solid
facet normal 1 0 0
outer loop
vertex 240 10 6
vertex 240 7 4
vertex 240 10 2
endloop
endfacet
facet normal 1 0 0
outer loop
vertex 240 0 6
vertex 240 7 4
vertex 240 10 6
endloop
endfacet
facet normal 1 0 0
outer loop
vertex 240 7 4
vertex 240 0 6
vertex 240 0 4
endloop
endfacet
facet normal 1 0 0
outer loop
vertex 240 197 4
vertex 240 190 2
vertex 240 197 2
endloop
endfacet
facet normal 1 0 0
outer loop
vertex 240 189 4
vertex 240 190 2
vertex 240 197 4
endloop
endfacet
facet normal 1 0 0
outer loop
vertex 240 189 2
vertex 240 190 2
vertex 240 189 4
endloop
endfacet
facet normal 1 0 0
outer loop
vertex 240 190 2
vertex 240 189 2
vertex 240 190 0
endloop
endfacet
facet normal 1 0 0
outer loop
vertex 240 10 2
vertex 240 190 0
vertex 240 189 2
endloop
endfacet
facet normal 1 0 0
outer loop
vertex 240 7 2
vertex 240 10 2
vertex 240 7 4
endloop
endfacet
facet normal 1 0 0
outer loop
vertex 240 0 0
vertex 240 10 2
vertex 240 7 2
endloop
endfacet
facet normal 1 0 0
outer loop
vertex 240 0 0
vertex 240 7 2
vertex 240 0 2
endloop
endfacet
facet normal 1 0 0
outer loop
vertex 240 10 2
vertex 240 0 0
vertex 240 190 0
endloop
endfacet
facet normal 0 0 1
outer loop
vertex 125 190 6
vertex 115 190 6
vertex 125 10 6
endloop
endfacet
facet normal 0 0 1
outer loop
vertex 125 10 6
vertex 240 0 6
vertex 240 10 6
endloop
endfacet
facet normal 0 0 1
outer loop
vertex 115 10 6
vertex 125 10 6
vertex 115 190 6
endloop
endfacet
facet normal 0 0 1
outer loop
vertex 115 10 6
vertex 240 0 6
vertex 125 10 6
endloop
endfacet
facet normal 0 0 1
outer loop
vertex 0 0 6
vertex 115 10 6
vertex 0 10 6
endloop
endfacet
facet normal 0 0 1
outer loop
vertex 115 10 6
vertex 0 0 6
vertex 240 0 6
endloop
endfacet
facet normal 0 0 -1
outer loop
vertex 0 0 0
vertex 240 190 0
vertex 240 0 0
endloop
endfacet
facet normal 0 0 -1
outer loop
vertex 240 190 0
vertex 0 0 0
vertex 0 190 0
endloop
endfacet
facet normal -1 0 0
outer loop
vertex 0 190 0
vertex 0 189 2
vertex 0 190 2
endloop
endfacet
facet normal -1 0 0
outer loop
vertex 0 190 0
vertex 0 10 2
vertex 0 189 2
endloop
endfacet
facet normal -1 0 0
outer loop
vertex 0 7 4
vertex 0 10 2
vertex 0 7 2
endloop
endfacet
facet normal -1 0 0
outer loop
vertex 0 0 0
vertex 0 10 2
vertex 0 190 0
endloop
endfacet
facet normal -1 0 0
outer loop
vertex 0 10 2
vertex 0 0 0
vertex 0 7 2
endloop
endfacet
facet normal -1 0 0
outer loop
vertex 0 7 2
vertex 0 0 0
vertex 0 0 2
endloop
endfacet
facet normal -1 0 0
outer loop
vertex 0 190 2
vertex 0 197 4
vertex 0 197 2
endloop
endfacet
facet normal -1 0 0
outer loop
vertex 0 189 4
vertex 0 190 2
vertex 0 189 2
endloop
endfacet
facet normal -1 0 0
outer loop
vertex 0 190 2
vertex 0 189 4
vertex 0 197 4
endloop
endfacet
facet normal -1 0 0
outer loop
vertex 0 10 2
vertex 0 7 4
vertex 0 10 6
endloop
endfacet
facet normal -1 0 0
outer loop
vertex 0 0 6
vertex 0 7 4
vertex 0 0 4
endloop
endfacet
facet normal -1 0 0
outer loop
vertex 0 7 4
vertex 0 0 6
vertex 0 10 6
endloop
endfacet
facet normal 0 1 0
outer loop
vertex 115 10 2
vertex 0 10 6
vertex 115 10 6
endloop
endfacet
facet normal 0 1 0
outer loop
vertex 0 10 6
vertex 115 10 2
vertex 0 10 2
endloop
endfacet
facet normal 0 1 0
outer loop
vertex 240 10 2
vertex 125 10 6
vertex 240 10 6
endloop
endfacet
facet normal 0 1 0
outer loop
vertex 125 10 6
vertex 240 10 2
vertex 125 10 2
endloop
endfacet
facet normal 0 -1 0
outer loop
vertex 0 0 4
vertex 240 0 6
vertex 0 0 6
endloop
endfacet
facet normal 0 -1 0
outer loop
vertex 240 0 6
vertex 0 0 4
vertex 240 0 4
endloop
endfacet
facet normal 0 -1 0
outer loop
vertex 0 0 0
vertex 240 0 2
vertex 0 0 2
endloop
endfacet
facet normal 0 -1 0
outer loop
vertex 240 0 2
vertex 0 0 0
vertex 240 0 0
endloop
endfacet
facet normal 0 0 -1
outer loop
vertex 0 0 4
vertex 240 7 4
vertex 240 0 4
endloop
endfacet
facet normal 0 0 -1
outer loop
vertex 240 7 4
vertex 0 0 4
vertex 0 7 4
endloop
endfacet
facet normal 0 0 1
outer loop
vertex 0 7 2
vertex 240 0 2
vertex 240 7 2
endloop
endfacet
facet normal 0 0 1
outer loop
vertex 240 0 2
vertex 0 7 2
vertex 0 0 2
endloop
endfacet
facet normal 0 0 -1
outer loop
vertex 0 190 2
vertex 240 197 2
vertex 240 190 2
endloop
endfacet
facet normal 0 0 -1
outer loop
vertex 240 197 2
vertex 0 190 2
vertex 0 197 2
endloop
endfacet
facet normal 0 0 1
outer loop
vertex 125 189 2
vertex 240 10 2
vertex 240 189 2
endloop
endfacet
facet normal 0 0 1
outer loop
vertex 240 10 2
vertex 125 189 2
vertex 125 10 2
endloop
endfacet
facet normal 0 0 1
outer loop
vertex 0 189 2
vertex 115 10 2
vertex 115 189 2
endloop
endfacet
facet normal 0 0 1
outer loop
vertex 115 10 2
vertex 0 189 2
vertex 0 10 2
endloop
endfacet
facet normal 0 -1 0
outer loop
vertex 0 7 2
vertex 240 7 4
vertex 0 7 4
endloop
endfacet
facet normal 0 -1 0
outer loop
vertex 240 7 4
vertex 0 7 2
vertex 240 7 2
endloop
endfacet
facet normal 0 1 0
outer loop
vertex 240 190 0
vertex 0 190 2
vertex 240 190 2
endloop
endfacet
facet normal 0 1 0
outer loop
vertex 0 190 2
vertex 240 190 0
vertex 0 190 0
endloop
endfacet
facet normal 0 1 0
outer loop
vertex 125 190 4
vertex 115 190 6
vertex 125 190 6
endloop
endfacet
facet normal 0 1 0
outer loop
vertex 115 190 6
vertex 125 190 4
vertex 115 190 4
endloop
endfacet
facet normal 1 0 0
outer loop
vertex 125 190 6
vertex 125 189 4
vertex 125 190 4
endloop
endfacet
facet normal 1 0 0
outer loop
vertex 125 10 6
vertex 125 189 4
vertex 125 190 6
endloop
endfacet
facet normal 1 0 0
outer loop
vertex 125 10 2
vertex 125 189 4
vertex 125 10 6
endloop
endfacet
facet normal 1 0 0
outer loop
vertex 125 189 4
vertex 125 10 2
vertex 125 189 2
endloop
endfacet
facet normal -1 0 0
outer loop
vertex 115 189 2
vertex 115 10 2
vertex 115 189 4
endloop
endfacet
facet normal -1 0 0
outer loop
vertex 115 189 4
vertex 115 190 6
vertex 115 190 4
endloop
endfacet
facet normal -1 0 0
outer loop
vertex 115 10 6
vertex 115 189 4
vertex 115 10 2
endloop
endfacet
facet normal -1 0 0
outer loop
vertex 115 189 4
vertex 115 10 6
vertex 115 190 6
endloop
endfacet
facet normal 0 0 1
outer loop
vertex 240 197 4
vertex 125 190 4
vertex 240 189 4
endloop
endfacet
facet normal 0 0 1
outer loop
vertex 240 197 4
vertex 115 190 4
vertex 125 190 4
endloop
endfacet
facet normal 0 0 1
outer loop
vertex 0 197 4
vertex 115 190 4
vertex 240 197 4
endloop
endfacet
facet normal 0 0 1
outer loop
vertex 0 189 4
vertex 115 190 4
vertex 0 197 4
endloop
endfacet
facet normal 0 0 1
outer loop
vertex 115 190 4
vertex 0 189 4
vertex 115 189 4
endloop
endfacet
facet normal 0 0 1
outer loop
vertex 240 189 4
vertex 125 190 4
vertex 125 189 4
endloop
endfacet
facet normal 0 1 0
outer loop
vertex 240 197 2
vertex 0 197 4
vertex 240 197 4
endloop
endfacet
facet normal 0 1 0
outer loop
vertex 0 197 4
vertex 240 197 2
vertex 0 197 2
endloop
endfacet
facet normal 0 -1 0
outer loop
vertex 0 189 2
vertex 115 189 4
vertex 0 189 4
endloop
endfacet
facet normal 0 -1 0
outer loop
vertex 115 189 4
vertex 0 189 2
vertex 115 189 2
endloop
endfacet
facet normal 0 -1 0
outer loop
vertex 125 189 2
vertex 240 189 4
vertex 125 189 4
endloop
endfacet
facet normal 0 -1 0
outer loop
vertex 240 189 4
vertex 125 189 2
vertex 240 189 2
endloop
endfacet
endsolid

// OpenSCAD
WideX=240;
DepthY=190;
ThickZ=2;
Buff=1;
SlottH=8;
ConnY=10;
BeamX=10;
DB=Buff*2;
ConnZ=ThickZ*3;

cube([WideX,DepthY,ThickZ]);
difference()
{
  cube([WideX,ConnY,ConnZ]);
  translate([-Buff,-Buff,ThickZ]) cube([WideX+DB,SlottH,ThickZ]);
}
translate([(WideX/2)-(BeamX/2),ConnY,0]) cube([BeamX,DepthY-ConnY,ConnZ]);
translate([0,DepthY-Buff,ThickZ]) cube([WideX,SlottH,ThickZ]);
